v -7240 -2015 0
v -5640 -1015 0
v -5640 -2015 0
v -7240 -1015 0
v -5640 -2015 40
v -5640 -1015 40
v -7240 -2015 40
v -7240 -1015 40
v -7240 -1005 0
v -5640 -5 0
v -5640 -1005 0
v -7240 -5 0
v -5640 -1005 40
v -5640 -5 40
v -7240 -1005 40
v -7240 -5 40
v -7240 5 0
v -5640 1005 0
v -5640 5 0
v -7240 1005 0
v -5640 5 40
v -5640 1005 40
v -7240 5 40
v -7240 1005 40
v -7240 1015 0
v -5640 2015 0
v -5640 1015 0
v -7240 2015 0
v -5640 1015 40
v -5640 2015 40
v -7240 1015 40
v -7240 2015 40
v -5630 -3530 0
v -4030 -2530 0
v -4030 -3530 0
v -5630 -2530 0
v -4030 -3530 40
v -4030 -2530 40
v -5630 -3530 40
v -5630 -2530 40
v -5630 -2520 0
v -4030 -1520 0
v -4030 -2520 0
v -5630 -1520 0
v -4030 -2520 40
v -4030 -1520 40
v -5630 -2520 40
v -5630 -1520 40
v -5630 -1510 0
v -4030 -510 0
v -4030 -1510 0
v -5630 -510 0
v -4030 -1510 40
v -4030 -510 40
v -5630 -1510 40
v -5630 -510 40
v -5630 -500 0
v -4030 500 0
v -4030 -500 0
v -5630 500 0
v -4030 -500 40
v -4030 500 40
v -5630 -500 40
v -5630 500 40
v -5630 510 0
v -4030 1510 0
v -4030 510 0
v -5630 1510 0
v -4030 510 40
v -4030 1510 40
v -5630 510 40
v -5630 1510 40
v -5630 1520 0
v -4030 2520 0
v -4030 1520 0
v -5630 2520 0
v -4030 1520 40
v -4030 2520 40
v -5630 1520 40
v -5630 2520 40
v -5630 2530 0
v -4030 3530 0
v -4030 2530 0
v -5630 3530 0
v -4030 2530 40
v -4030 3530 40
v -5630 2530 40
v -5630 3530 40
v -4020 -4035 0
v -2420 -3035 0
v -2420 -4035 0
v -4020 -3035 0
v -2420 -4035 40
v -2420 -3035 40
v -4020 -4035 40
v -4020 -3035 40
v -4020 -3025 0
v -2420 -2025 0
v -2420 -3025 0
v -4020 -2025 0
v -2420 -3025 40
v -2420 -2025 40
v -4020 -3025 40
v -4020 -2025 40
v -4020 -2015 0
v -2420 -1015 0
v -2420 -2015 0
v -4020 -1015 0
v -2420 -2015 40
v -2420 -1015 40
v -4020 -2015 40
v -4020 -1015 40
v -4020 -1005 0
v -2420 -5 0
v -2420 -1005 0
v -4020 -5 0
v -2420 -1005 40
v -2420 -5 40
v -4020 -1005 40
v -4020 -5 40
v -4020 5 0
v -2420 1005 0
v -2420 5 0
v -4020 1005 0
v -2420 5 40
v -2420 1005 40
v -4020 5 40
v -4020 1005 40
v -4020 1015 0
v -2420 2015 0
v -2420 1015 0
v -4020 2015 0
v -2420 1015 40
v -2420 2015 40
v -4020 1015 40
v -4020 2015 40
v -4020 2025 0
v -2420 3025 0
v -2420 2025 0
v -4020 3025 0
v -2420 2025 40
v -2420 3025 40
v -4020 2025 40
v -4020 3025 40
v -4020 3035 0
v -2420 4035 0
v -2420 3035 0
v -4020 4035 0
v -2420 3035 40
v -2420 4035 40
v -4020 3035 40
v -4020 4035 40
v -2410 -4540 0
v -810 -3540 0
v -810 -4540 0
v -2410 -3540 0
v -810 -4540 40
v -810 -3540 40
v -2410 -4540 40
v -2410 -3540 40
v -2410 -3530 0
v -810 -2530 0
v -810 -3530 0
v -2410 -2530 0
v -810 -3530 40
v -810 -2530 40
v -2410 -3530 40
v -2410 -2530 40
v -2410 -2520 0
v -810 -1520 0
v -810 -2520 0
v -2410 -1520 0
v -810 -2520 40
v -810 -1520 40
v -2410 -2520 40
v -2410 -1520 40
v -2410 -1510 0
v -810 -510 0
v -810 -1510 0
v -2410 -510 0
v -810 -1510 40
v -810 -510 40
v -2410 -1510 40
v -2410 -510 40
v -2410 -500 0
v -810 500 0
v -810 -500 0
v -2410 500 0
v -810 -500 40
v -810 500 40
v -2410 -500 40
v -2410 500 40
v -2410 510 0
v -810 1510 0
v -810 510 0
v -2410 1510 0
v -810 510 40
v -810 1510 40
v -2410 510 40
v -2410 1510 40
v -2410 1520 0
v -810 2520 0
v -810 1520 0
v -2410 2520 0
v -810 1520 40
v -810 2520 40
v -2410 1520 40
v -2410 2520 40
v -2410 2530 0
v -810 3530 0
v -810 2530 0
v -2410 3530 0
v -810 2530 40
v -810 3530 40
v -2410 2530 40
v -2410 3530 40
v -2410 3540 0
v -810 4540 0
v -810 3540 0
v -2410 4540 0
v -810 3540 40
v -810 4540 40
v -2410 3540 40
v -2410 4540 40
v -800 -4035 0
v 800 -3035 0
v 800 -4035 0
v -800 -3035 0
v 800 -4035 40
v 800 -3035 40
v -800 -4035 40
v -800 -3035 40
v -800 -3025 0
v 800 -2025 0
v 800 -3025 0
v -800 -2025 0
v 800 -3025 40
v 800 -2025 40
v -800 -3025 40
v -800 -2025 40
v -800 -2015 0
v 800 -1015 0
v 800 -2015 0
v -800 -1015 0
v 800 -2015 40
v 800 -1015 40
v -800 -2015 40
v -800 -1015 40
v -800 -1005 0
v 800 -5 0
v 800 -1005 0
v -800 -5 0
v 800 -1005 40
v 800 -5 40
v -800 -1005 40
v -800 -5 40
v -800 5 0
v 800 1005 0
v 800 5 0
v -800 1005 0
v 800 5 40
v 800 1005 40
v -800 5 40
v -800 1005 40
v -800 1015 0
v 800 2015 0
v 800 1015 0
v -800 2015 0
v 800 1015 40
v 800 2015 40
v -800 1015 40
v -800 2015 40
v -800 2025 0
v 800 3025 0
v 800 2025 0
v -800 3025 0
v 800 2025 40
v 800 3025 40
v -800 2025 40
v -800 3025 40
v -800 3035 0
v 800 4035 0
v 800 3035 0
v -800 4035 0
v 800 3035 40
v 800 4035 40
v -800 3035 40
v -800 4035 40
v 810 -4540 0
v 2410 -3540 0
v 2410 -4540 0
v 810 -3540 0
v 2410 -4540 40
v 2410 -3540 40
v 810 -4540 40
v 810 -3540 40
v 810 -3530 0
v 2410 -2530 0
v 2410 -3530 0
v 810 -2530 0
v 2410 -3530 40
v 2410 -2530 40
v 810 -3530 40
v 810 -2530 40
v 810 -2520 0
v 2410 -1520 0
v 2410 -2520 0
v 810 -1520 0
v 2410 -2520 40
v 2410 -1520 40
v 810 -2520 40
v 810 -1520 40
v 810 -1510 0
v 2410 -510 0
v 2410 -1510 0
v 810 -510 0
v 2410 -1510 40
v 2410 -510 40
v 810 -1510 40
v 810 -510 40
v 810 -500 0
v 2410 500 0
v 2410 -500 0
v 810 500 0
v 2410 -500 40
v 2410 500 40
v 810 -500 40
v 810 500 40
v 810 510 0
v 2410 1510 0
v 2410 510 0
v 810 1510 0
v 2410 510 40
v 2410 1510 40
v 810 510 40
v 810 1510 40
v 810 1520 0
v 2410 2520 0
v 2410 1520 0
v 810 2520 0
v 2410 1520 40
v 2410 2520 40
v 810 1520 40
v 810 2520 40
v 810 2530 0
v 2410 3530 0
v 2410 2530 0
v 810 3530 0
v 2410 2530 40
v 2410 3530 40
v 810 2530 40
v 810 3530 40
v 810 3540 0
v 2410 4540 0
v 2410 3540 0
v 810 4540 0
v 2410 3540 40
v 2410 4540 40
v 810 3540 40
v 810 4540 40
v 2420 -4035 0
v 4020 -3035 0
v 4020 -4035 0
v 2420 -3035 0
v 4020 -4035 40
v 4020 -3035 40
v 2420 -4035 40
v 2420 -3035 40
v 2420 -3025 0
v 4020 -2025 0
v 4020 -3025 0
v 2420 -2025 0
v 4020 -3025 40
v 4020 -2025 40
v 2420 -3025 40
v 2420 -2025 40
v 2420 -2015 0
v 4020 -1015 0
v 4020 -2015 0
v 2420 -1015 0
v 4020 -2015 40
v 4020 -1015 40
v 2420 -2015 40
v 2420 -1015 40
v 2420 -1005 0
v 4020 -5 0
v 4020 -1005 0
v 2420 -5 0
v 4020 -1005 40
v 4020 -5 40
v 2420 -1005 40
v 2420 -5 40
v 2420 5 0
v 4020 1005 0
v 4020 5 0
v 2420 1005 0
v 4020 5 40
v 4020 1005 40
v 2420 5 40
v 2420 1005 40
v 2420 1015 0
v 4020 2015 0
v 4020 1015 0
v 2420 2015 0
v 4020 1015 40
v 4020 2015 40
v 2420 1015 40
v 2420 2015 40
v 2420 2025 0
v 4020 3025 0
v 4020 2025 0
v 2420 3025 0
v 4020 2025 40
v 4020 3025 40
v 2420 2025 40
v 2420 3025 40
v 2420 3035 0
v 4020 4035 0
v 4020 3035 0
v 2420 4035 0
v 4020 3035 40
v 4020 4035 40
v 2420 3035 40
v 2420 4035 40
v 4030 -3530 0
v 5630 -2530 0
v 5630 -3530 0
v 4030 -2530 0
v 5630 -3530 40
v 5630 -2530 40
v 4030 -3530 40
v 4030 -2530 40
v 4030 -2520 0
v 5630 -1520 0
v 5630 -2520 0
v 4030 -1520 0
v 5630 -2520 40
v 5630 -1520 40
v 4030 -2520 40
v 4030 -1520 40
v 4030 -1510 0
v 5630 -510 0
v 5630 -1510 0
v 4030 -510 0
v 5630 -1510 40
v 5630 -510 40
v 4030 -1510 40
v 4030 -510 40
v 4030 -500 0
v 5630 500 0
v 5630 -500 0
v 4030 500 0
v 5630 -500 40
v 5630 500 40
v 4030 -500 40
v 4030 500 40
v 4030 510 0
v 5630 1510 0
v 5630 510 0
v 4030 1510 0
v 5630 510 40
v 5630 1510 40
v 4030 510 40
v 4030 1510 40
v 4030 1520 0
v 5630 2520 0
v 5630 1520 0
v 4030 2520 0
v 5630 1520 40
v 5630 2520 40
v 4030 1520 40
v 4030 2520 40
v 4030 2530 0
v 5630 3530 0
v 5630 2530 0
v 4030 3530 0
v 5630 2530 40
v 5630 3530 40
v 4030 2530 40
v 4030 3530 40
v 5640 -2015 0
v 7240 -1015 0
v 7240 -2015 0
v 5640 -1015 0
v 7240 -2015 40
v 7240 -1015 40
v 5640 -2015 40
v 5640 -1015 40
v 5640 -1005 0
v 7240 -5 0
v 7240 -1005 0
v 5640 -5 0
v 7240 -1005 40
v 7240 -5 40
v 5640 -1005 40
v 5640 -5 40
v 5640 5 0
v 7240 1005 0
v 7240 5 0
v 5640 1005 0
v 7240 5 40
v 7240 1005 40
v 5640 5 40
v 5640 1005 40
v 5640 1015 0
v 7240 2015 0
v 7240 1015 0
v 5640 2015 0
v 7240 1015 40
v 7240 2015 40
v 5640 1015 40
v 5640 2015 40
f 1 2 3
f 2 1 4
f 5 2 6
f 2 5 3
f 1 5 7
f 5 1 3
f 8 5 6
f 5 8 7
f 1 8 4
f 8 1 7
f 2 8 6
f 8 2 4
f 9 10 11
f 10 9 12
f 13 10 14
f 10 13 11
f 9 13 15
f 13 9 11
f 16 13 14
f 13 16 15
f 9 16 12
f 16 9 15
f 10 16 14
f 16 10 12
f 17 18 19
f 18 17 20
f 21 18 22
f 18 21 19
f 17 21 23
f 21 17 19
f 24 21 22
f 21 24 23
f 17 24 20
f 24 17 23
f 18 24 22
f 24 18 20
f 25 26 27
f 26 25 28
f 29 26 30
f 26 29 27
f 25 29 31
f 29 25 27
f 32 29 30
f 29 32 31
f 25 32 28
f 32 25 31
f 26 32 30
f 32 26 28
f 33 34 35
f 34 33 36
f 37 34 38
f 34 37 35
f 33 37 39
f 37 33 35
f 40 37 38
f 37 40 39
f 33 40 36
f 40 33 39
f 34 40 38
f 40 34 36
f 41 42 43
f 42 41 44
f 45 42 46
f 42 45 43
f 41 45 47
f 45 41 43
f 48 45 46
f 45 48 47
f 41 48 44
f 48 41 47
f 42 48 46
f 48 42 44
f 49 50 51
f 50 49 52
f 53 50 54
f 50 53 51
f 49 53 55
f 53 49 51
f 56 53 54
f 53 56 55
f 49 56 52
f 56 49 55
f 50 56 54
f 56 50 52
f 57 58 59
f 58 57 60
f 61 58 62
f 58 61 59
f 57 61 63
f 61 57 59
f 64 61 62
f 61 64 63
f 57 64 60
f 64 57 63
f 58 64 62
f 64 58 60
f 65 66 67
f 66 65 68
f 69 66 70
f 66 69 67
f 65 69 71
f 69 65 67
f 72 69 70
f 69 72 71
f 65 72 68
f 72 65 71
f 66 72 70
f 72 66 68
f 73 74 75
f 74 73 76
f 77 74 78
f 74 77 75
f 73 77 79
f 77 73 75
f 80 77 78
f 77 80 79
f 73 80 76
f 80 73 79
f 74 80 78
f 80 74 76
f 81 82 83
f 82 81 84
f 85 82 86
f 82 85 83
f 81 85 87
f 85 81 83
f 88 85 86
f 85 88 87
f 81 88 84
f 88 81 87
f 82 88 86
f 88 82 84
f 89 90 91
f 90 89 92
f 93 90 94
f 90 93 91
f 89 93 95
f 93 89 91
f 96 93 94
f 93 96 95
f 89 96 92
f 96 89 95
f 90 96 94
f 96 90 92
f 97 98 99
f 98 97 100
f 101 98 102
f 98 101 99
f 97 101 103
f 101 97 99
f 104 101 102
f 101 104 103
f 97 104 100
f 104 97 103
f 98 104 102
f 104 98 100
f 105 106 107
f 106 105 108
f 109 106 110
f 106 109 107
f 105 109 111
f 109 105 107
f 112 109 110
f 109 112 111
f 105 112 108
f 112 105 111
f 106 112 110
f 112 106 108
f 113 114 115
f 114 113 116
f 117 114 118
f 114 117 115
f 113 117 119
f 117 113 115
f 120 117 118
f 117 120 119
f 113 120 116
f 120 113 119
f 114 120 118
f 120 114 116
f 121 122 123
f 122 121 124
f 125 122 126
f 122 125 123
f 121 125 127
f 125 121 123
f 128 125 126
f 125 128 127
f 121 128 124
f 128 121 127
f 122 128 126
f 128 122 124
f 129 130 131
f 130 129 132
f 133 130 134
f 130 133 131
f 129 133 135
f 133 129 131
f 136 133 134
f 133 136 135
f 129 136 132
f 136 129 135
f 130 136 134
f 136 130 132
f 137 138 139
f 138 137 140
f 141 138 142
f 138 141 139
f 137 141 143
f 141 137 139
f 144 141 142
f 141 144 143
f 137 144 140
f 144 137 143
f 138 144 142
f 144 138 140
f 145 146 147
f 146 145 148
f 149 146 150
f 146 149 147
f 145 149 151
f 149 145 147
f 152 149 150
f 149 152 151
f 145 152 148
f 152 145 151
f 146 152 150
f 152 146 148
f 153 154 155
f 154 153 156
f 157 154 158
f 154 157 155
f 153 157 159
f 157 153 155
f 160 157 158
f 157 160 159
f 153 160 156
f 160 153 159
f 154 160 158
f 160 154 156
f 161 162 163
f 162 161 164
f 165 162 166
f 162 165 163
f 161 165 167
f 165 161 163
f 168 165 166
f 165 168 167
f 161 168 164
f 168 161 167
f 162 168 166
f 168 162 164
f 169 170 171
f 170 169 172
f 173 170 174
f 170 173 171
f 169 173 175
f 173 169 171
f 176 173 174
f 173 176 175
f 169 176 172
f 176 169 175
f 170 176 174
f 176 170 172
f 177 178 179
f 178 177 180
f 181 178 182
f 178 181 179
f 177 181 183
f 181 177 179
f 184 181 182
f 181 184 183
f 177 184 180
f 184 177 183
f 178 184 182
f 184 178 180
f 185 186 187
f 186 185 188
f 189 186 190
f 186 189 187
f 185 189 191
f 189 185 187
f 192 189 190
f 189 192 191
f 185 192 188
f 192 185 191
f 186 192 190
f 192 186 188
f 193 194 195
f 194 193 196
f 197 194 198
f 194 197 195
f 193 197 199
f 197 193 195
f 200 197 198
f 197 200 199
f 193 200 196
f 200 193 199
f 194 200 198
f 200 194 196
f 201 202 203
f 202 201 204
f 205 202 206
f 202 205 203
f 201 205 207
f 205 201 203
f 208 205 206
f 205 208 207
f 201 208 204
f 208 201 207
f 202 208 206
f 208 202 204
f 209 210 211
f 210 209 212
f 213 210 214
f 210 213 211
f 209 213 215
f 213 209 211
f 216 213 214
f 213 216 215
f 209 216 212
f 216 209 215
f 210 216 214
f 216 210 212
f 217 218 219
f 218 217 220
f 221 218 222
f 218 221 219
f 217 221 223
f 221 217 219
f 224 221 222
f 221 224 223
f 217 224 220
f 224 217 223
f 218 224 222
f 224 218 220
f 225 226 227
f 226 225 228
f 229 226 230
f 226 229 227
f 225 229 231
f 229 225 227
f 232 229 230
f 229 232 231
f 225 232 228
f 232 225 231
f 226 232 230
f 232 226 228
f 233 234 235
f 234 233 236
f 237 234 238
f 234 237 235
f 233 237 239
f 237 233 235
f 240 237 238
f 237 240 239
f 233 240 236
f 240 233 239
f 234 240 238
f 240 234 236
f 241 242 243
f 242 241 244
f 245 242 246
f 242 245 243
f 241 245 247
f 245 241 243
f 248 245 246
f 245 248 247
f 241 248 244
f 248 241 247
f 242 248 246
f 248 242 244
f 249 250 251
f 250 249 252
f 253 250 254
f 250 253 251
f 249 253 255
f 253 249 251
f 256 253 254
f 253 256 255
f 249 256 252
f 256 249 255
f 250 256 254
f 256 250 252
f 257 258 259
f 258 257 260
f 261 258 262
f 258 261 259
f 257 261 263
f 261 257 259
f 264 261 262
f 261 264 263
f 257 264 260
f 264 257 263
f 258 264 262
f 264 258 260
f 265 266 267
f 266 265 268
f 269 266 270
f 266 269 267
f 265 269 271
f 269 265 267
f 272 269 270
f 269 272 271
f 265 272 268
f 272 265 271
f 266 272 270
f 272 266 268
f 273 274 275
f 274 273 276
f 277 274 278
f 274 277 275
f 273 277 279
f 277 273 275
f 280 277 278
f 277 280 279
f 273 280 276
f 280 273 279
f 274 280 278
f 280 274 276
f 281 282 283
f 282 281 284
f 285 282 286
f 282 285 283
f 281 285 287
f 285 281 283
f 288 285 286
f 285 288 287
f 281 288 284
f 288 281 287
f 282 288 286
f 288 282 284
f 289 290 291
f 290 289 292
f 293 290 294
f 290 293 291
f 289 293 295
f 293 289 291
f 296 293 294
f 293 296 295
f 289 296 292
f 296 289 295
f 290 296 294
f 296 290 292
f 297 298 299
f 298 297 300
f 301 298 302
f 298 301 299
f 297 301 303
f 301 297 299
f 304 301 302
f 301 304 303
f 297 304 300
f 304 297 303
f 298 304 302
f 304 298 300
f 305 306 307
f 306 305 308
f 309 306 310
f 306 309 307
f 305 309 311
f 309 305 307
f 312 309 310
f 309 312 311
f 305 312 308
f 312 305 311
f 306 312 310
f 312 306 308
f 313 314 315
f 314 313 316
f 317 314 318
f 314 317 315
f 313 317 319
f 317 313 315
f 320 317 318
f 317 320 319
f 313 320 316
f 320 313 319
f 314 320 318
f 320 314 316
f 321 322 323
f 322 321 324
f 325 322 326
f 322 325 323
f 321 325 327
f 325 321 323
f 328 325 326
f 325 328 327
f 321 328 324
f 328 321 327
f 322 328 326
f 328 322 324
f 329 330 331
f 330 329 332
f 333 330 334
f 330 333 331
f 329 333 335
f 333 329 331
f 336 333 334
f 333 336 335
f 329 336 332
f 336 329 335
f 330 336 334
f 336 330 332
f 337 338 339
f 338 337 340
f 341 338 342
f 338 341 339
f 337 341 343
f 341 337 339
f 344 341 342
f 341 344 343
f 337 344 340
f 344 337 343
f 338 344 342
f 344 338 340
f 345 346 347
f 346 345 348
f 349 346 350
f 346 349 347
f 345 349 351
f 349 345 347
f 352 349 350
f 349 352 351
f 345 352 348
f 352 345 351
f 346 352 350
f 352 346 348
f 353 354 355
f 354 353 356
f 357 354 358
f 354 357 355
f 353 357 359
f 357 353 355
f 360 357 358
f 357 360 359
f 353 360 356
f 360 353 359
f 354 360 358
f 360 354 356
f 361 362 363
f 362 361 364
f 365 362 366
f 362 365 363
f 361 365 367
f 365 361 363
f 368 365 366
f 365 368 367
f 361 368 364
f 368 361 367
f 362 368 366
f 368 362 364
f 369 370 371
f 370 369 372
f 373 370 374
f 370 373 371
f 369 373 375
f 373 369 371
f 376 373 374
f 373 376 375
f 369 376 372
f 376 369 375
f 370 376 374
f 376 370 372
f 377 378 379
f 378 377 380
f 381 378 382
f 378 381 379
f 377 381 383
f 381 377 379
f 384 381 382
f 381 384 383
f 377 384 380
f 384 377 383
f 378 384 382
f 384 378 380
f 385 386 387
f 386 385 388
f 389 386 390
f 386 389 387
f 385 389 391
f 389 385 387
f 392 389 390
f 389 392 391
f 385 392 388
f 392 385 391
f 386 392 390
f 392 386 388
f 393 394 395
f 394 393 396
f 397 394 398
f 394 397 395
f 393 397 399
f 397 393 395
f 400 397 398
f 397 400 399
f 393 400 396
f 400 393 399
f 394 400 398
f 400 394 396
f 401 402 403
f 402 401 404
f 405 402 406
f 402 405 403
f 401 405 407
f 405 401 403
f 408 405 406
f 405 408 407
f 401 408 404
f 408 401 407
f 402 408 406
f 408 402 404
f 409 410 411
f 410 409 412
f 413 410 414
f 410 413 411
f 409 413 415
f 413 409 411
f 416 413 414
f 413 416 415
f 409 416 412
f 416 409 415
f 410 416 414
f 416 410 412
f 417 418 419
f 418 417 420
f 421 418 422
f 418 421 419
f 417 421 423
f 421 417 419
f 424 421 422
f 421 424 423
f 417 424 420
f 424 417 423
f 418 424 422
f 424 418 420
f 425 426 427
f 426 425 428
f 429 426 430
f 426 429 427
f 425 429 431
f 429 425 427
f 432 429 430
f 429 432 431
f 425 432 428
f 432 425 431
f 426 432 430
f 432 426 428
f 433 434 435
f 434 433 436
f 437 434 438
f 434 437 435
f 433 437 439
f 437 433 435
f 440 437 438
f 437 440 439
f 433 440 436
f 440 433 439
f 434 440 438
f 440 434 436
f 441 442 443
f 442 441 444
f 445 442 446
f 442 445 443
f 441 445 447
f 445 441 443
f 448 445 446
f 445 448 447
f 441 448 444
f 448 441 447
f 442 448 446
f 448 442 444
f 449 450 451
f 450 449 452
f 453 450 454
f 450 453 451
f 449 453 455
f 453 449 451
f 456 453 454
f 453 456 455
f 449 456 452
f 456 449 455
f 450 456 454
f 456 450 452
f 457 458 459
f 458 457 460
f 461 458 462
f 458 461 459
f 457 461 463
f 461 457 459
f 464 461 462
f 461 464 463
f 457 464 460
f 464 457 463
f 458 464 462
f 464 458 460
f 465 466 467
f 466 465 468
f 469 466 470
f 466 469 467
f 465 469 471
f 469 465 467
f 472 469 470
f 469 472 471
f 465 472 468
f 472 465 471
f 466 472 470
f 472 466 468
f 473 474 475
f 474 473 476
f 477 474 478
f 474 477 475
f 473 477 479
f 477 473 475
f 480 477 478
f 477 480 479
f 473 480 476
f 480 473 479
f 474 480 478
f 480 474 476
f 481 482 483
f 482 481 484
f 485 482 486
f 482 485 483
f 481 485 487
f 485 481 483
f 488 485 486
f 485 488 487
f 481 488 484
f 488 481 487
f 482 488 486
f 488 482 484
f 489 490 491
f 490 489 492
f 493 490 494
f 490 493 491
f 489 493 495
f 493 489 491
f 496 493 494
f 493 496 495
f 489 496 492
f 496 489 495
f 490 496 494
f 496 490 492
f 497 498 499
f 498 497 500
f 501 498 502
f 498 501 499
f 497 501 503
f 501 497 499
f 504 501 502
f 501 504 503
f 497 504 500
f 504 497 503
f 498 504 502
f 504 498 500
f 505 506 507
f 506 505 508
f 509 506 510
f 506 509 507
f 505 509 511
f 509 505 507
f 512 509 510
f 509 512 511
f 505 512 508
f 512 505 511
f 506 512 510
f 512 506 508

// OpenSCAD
// Generated by Parametrix
ca_surface_faceSurface_000 = [ [ -7240.0000, -2015.0000 ],[ -5640.0000, -2015.0000 ],[ -5640.0000, -1015.0000 ],[ -7240.0000, -1015.0000 ],[ -7240.0000, -2015.0000 ] ];
cb_surface_faceSurface_000 = [  0, 1, 2, 3, 4 ];
ca_surface_faceSurface_001 = [ [ -7240.0000, -1005.0000 ],[ -5640.0000, -1005.0000 ],[ -5640.0000, -5.0000 ],[ -7240.0000, -5.0000 ],[ -7240.0000, -1005.0000 ] ];
cb_surface_faceSurface_001 = [  5, 6, 7, 8, 9 ];
ca_surface_faceSurface_002 = [ [ -7240.0000, 5.0000 ],[ -5640.0000, 5.0000 ],[ -5640.0000, 1005.0000 ],[ -7240.0000, 1005.0000 ],[ -7240.0000, 5.0000 ] ];
cb_surface_faceSurface_002 = [  10, 11, 12, 13, 14 ];
ca_surface_faceSurface_003 = [ [ -7240.0000, 1015.0000 ],[ -5640.0000, 1015.0000 ],[ -5640.0000, 2015.0000 ],[ -7240.0000, 2015.0000 ],[ -7240.0000, 1015.0000 ] ];
cb_surface_faceSurface_003 = [  15, 16, 17, 18, 19 ];
ca_surface_faceSurface_004 = [ [ -5630.0000, -3530.0000 ],[ -4030.0000, -3530.0000 ],[ -4030.0000, -2530.0000 ],[ -5630.0000, -2530.0000 ],[ -5630.0000, -3530.0000 ] ];
cb_surface_faceSurface_004 = [  20, 21, 22, 23, 24 ];
ca_surface_faceSurface_005 = [ [ -5630.0000, -2520.0000 ],[ -4030.0000, -2520.0000 ],[ -4030.0000, -1520.0000 ],[ -5630.0000, -1520.0000 ],[ -5630.0000, -2520.0000 ] ];
cb_surface_faceSurface_005 = [  25, 26, 27, 28, 29 ];
ca_surface_faceSurface_006 = [ [ -5630.0000, -1510.0000 ],[ -4030.0000, -1510.0000 ],[ -4030.0000, -510.0000 ],[ -5630.0000, -510.0000 ],[ -5630.0000, -1510.0000 ] ];
cb_surface_faceSurface_006 = [  30, 31, 32, 33, 34 ];
ca_surface_faceSurface_007 = [ [ -5630.0000, -500.0000 ],[ -4030.0000, -500.0000 ],[ -4030.0000, 500.0000 ],[ -5630.0000, 500.0000 ],[ -5630.0000, -500.0000 ] ];
cb_surface_faceSurface_007 = [  35, 36, 37, 38, 39 ];
ca_surface_faceSurface_008 = [ [ -5630.0000, 510.0000 ],[ -4030.0000, 510.0000 ],[ -4030.0000, 1510.0000 ],[ -5630.0000, 1510.0000 ],[ -5630.0000, 510.0000 ] ];
cb_surface_faceSurface_008 = [  40, 41, 42, 43, 44 ];
ca_surface_faceSurface_009 = [ [ -5630.0000, 1520.0000 ],[ -4030.0000, 1520.0000 ],[ -4030.0000, 2520.0000 ],[ -5630.0000, 2520.0000 ],[ -5630.0000, 1520.0000 ] ];
cb_surface_faceSurface_009 = [  45, 46, 47, 48, 49 ];
ca_surface_faceSurface_010 = [ [ -5630.0000, 2530.0000 ],[ -4030.0000, 2530.0000 ],[ -4030.0000, 3530.0000 ],[ -5630.0000, 3530.0000 ],[ -5630.0000, 2530.0000 ] ];
cb_surface_faceSurface_010 = [  50, 51, 52, 53, 54 ];
ca_surface_faceSurface_011 = [ [ -4020.0000, -4035.0000 ],[ -2420.0000, -4035.0000 ],[ -2420.0000, -3035.0000 ],[ -4020.0000, -3035.0000 ],[ -4020.0000, -4035.0000 ] ];
cb_surface_faceSurface_011 = [  55, 56, 57, 58, 59 ];
ca_surface_faceSurface_012 = [ [ -4020.0000, -3025.0000 ],[ -2420.0000, -3025.0000 ],[ -2420.0000, -2025.0000 ],[ -4020.0000, -2025.0000 ],[ -4020.0000, -3025.0000 ] ];
cb_surface_faceSurface_012 = [  60, 61, 62, 63, 64 ];
ca_surface_faceSurface_013 = [ [ -4020.0000, -2015.0000 ],[ -2420.0000, -2015.0000 ],[ -2420.0000, -1015.0000 ],[ -4020.0000, -1015.0000 ],[ -4020.0000, -2015.0000 ] ];
cb_surface_faceSurface_013 = [  65, 66, 67, 68, 69 ];
ca_surface_faceSurface_014 = [ [ -4020.0000, -1005.0000 ],[ -2420.0000, -1005.0000 ],[ -2420.0000, -5.0000 ],[ -4020.0000, -5.0000 ],[ -4020.0000, -1005.0000 ] ];
cb_surface_faceSurface_014 = [  70, 71, 72, 73, 74 ];
ca_surface_faceSurface_015 = [ [ -4020.0000, 5.0000 ],[ -2420.0000, 5.0000 ],[ -2420.0000, 1005.0000 ],[ -4020.0000, 1005.0000 ],[ -4020.0000, 5.0000 ] ];
cb_surface_faceSurface_015 = [  75, 76, 77, 78, 79 ];
ca_surface_faceSurface_016 = [ [ -4020.0000, 1015.0000 ],[ -2420.0000, 1015.0000 ],[ -2420.0000, 2015.0000 ],[ -4020.0000, 2015.0000 ],[ -4020.0000, 1015.0000 ] ];
cb_surface_faceSurface_016 = [  80, 81, 82, 83, 84 ];
ca_surface_faceSurface_017 = [ [ -4020.0000, 2025.0000 ],[ -2420.0000, 2025.0000 ],[ -2420.0000, 3025.0000 ],[ -4020.0000, 3025.0000 ],[ -4020.0000, 2025.0000 ] ];
cb_surface_faceSurface_017 = [  85, 86, 87, 88, 89 ];
ca_surface_faceSurface_018 = [ [ -4020.0000, 3035.0000 ],[ -2420.0000, 3035.0000 ],[ -2420.0000, 4035.0000 ],[ -4020.0000, 4035.0000 ],[ -4020.0000, 3035.0000 ] ];
cb_surface_faceSurface_018 = [  90, 91, 92, 93, 94 ];
ca_surface_faceSurface_019 = [ [ -2410.0000, -4540.0000 ],[ -810.0000, -4540.0000 ],[ -810.0000, -3540.0000 ],[ -2410.0000, -3540.0000 ],[ -2410.0000, -4540.0000 ] ];
cb_surface_faceSurface_019 = [  95, 96, 97, 98, 99 ];
ca_surface_faceSurface_020 = [ [ -2410.0000, -3530.0000 ],[ -810.0000, -3530.0000 ],[ -810.0000, -2530.0000 ],[ -2410.0000, -2530.0000 ],[ -2410.0000, -3530.0000 ] ];
cb_surface_faceSurface_020 = [  100, 101, 102, 103, 104 ];
ca_surface_faceSurface_021 = [ [ -2410.0000, -2520.0000 ],[ -810.0000, -2520.0000 ],[ -810.0000, -1520.0000 ],[ -2410.0000, -1520.0000 ],[ -2410.0000, -2520.0000 ] ];
cb_surface_faceSurface_021 = [  105, 106, 107, 108, 109 ];
ca_surface_faceSurface_022 = [ [ -2410.0000, -1510.0000 ],[ -810.0000, -1510.0000 ],[ -810.0000, -510.0000 ],[ -2410.0000, -510.0000 ],[ -2410.0000, -1510.0000 ] ];
cb_surface_faceSurface_022 = [  110, 111, 112, 113, 114 ];
ca_surface_faceSurface_023 = [ [ -2410.0000, -500.0000 ],[ -810.0000, -500.0000 ],[ -810.0000, 500.0000 ],[ -2410.0000, 500.0000 ],[ -2410.0000, -500.0000 ] ];
cb_surface_faceSurface_023 = [  115, 116, 117, 118, 119 ];
ca_surface_faceSurface_024 = [ [ -2410.0000, 510.0000 ],[ -810.0000, 510.0000 ],[ -810.0000, 1510.0000 ],[ -2410.0000, 1510.0000 ],[ -2410.0000, 510.0000 ] ];
cb_surface_faceSurface_024 = [  120, 121, 122, 123, 124 ];
ca_surface_faceSurface_025 = [ [ -2410.0000, 1520.0000 ],[ -810.0000, 1520.0000 ],[ -810.0000, 2520.0000 ],[ -2410.0000, 2520.0000 ],[ -2410.0000, 1520.0000 ] ];
cb_surface_faceSurface_025 = [  125, 126, 127, 128, 129 ];
ca_surface_faceSurface_026 = [ [ -2410.0000, 2530.0000 ],[ -810.0000, 2530.0000 ],[ -810.0000, 3530.0000 ],[ -2410.0000, 3530.0000 ],[ -2410.0000, 2530.0000 ] ];
cb_surface_faceSurface_026 = [  130, 131, 132, 133, 134 ];
ca_surface_faceSurface_027 = [ [ -2410.0000, 3540.0000 ],[ -810.0000, 3540.0000 ],[ -810.0000, 4540.0000 ],[ -2410.0000, 4540.0000 ],[ -2410.0000, 3540.0000 ] ];
cb_surface_faceSurface_027 = [  135, 136, 137, 138, 139 ];
ca_surface_faceSurface_028 = [ [ -800.0000, -4035.0000 ],[ 800.0000, -4035.0000 ],[ 800.0000, -3035.0000 ],[ -800.0000, -3035.0000 ],[ -800.0000, -4035.0000 ] ];
cb_surface_faceSurface_028 = [  140, 141, 142, 143, 144 ];
ca_surface_faceSurface_029 = [ [ -800.0000, -3025.0000 ],[ 800.0000, -3025.0000 ],[ 800.0000, -2025.0000 ],[ -800.0000, -2025.0000 ],[ -800.0000, -3025.0000 ] ];
cb_surface_faceSurface_029 = [  145, 146, 147, 148, 149 ];
ca_surface_faceSurface_030 = [ [ -800.0000, -2015.0000 ],[ 800.0000, -2015.0000 ],[ 800.0000, -1015.0000 ],[ -800.0000, -1015.0000 ],[ -800.0000, -2015.0000 ] ];
cb_surface_faceSurface_030 = [  150, 151, 152, 153, 154 ];
ca_surface_faceSurface_031 = [ [ -800.0000, -1005.0000 ],[ 800.0000, -1005.0000 ],[ 800.0000, -5.0000 ],[ -800.0000, -5.0000 ],[ -800.0000, -1005.0000 ] ];
cb_surface_faceSurface_031 = [  155, 156, 157, 158, 159 ];
ca_surface_faceSurface_032 = [ [ -800.0000, 5.0000 ],[ 800.0000, 5.0000 ],[ 800.0000, 1005.0000 ],[ -800.0000, 1005.0000 ],[ -800.0000, 5.0000 ] ];
cb_surface_faceSurface_032 = [  160, 161, 162, 163, 164 ];
ca_surface_faceSurface_033 = [ [ -800.0000, 1015.0000 ],[ 800.0000, 1015.0000 ],[ 800.0000, 2015.0000 ],[ -800.0000, 2015.0000 ],[ -800.0000, 1015.0000 ] ];
cb_surface_faceSurface_033 = [  165, 166, 167, 168, 169 ];
ca_surface_faceSurface_034 = [ [ -800.0000, 2025.0000 ],[ 800.0000, 2025.0000 ],[ 800.0000, 3025.0000 ],[ -800.0000, 3025.0000 ],[ -800.0000, 2025.0000 ] ];
cb_surface_faceSurface_034 = [  170, 171, 172, 173, 174 ];
ca_surface_faceSurface_035 = [ [ -800.0000, 3035.0000 ],[ 800.0000, 3035.0000 ],[ 800.0000, 4035.0000 ],[ -800.0000, 4035.0000 ],[ -800.0000, 3035.0000 ] ];
cb_surface_faceSurface_035 = [  175, 176, 177, 178, 179 ];
ca_surface_faceSurface_036 = [ [ 810.0000, -4540.0000 ],[ 2410.0000, -4540.0000 ],[ 2410.0000, -3540.0000 ],[ 810.0000, -3540.0000 ],[ 810.0000, -4540.0000 ] ];
cb_surface_faceSurface_036 = [  180, 181, 182, 183, 184 ];
ca_surface_faceSurface_037 = [ [ 810.0000, -3530.0000 ],[ 2410.0000, -3530.0000 ],[ 2410.0000, -2530.0000 ],[ 810.0000, -2530.0000 ],[ 810.0000, -3530.0000 ] ];
cb_surface_faceSurface_037 = [  185, 186, 187, 188, 189 ];
ca_surface_faceSurface_038 = [ [ 810.0000, -2520.0000 ],[ 2410.0000, -2520.0000 ],[ 2410.0000, -1520.0000 ],[ 810.0000, -1520.0000 ],[ 810.0000, -2520.0000 ] ];
cb_surface_faceSurface_038 = [  190, 191, 192, 193, 194 ];
ca_surface_faceSurface_039 = [ [ 810.0000, -1510.0000 ],[ 2410.0000, -1510.0000 ],[ 2410.0000, -510.0000 ],[ 810.0000, -510.0000 ],[ 810.0000, -1510.0000 ] ];
cb_surface_faceSurface_039 = [  195, 196, 197, 198, 199 ];
ca_surface_faceSurface_040 = [ [ 810.0000, -500.0000 ],[ 2410.0000, -500.0000 ],[ 2410.0000, 500.0000 ],[ 810.0000, 500.0000 ],[ 810.0000, -500.0000 ] ];
cb_surface_faceSurface_040 = [  200, 201, 202, 203, 204 ];
ca_surface_faceSurface_041 = [ [ 810.0000, 510.0000 ],[ 2410.0000, 510.0000 ],[ 2410.0000, 1510.0000 ],[ 810.0000, 1510.0000 ],[ 810.0000, 510.0000 ] ];
cb_surface_faceSurface_041 = [  205, 206, 207, 208, 209 ];
ca_surface_faceSurface_042 = [ [ 810.0000, 1520.0000 ],[ 2410.0000, 1520.0000 ],[ 2410.0000, 2520.0000 ],[ 810.0000, 2520.0000 ],[ 810.0000, 1520.0000 ] ];
cb_surface_faceSurface_042 = [  210, 211, 212, 213, 214 ];
ca_surface_faceSurface_043 = [ [ 810.0000, 2530.0000 ],[ 2410.0000, 2530.0000 ],[ 2410.0000, 3530.0000 ],[ 810.0000, 3530.0000 ],[ 810.0000, 2530.0000 ] ];
cb_surface_faceSurface_043 = [  215, 216, 217, 218, 219 ];
ca_surface_faceSurface_044 = [ [ 810.0000, 3540.0000 ],[ 2410.0000, 3540.0000 ],[ 2410.0000, 4540.0000 ],[ 810.0000, 4540.0000 ],[ 810.0000, 3540.0000 ] ];
cb_surface_faceSurface_044 = [  220, 221, 222, 223, 224 ];
ca_surface_faceSurface_045 = [ [ 2420.0000, -4035.0000 ],[ 4020.0000, -4035.0000 ],[ 4020.0000, -3035.0000 ],[ 2420.0000, -3035.0000 ],[ 2420.0000, -4035.0000 ] ];
cb_surface_faceSurface_045 = [  225, 226, 227, 228, 229 ];
ca_surface_faceSurface_046 = [ [ 2420.0000, -3025.0000 ],[ 4020.0000, -3025.0000 ],[ 4020.0000, -2025.0000 ],[ 2420.0000, -2025.0000 ],[ 2420.0000, -3025.0000 ] ];
cb_surface_faceSurface_046 = [  230, 231, 232, 233, 234 ];
ca_surface_faceSurface_047 = [ [ 2420.0000, -2015.0000 ],[ 4020.0000, -2015.0000 ],[ 4020.0000, -1015.0000 ],[ 2420.0000, -1015.0000 ],[ 2420.0000, -2015.0000 ] ];
cb_surface_faceSurface_047 = [  235, 236, 237, 238, 239 ];
ca_surface_faceSurface_048 = [ [ 2420.0000, -1005.0000 ],[ 4020.0000, -1005.0000 ],[ 4020.0000, -5.0000 ],[ 2420.0000, -5.0000 ],[ 2420.0000, -1005.0000 ] ];
cb_surface_faceSurface_048 = [  240, 241, 242, 243, 244 ];
ca_surface_faceSurface_049 = [ [ 2420.0000, 5.0000 ],[ 4020.0000, 5.0000 ],[ 4020.0000, 1005.0000 ],[ 2420.0000, 1005.0000 ],[ 2420.0000, 5.0000 ] ];
cb_surface_faceSurface_049 = [  245, 246, 247, 248, 249 ];
ca_surface_faceSurface_050 = [ [ 2420.0000, 1015.0000 ],[ 4020.0000, 1015.0000 ],[ 4020.0000, 2015.0000 ],[ 2420.0000, 2015.0000 ],[ 2420.0000, 1015.0000 ] ];
cb_surface_faceSurface_050 = [  250, 251, 252, 253, 254 ];
ca_surface_faceSurface_051 = [ [ 2420.0000, 2025.0000 ],[ 4020.0000, 2025.0000 ],[ 4020.0000, 3025.0000 ],[ 2420.0000, 3025.0000 ],[ 2420.0000, 2025.0000 ] ];
cb_surface_faceSurface_051 = [  255, 256, 257, 258, 259 ];
ca_surface_faceSurface_052 = [ [ 2420.0000, 3035.0000 ],[ 4020.0000, 3035.0000 ],[ 4020.0000, 4035.0000 ],[ 2420.0000, 4035.0000 ],[ 2420.0000, 3035.0000 ] ];
cb_surface_faceSurface_052 = [  260, 261, 262, 263, 264 ];
ca_surface_faceSurface_053 = [ [ 4030.0000, -3530.0000 ],[ 5630.0000, -3530.0000 ],[ 5630.0000, -2530.0000 ],[ 4030.0000, -2530.0000 ],[ 4030.0000, -3530.0000 ] ];
cb_surface_faceSurface_053 = [  265, 266, 267, 268, 269 ];
ca_surface_faceSurface_054 = [ [ 4030.0000, -2520.0000 ],[ 5630.0000, -2520.0000 ],[ 5630.0000, -1520.0000 ],[ 4030.0000, -1520.0000 ],[ 4030.0000, -2520.0000 ] ];
cb_surface_faceSurface_054 = [  270, 271, 272, 273, 274 ];
ca_surface_faceSurface_055 = [ [ 4030.0000, -1510.0000 ],[ 5630.0000, -1510.0000 ],[ 5630.0000, -510.0000 ],[ 4030.0000, -510.0000 ],[ 4030.0000, -1510.0000 ] ];
cb_surface_faceSurface_055 = [  275, 276, 277, 278, 279 ];
ca_surface_faceSurface_056 = [ [ 4030.0000, -500.0000 ],[ 5630.0000, -500.0000 ],[ 5630.0000, 500.0000 ],[ 4030.0000, 500.0000 ],[ 4030.0000, -500.0000 ] ];
cb_surface_faceSurface_056 = [  280, 281, 282, 283, 284 ];
ca_surface_faceSurface_057 = [ [ 4030.0000, 510.0000 ],[ 5630.0000, 510.0000 ],[ 5630.0000, 1510.0000 ],[ 4030.0000, 1510.0000 ],[ 4030.0000, 510.0000 ] ];
cb_surface_faceSurface_057 = [  285, 286, 287, 288, 289 ];
ca_surface_faceSurface_058 = [ [ 4030.0000, 1520.0000 ],[ 5630.0000, 1520.0000 ],[ 5630.0000, 2520.0000 ],[ 4030.0000, 2520.0000 ],[ 4030.0000, 1520.0000 ] ];
cb_surface_faceSurface_058 = [  290, 291, 292, 293, 294 ];
ca_surface_faceSurface_059 = [ [ 4030.0000, 2530.0000 ],[ 5630.0000, 2530.0000 ],[ 5630.0000, 3530.0000 ],[ 4030.0000, 3530.0000 ],[ 4030.0000, 2530.0000 ] ];
cb_surface_faceSurface_059 = [  295, 296, 297, 298, 299 ];
ca_surface_faceSurface_060 = [ [ 5640.0000, -2015.0000 ],[ 7240.0000, -2015.0000 ],[ 7240.0000, -1015.0000 ],[ 5640.0000, -1015.0000 ],[ 5640.0000, -2015.0000 ] ];
cb_surface_faceSurface_060 = [  300, 301, 302, 303, 304 ];
ca_surface_faceSurface_061 = [ [ 5640.0000, -1005.0000 ],[ 7240.0000, -1005.0000 ],[ 7240.0000, -5.0000 ],[ 5640.0000, -5.0000 ],[ 5640.0000, -1005.0000 ] ];
cb_surface_faceSurface_061 = [  305, 306, 307, 308, 309 ];
ca_surface_faceSurface_062 = [ [ 5640.0000, 5.0000 ],[ 7240.0000, 5.0000 ],[ 7240.0000, 1005.0000 ],[ 5640.0000, 1005.0000 ],[ 5640.0000, 5.0000 ] ];
cb_surface_faceSurface_062 = [  310, 311, 312, 313, 314 ];
ca_surface_faceSurface_063 = [ [ 5640.0000, 1015.0000 ],[ 7240.0000, 1015.0000 ],[ 7240.0000, 2015.0000 ],[ 5640.0000, 2015.0000 ],[ 5640.0000, 1015.0000 ] ];
cb_surface_faceSurface_063 = [  315, 316, 317, 318, 319 ];
a_surface_faceSurface = concat(ca_surface_faceSurface_000, ca_surface_faceSurface_001, ca_surface_faceSurface_002, ca_surface_faceSurface_003, ca_surface_faceSurface_004, ca_surface_faceSurface_005, ca_surface_faceSurface_006, ca_surface_faceSurface_007, ca_surface_faceSurface_008, ca_surface_faceSurface_009, ca_surface_faceSurface_010, ca_surface_faceSurface_011, ca_surface_faceSurface_012, ca_surface_faceSurface_013, ca_surface_faceSurface_014, ca_surface_faceSurface_015, ca_surface_faceSurface_016, ca_surface_faceSurface_017, ca_surface_faceSurface_018, ca_surface_faceSurface_019, ca_surface_faceSurface_020, ca_surface_faceSurface_021, ca_surface_faceSurface_022, ca_surface_faceSurface_023, ca_surface_faceSurface_024, ca_surface_faceSurface_025, ca_surface_faceSurface_026, ca_surface_faceSurface_027, ca_surface_faceSurface_028, ca_surface_faceSurface_029, ca_surface_faceSurface_030, ca_surface_faceSurface_031, ca_surface_faceSurface_032, ca_surface_faceSurface_033, ca_surface_faceSurface_034, ca_surface_faceSurface_035, ca_surface_faceSurface_036, ca_surface_faceSurface_037, ca_surface_faceSurface_038, ca_surface_faceSurface_039, ca_surface_faceSurface_040, ca_surface_faceSurface_041, ca_surface_faceSurface_042, ca_surface_faceSurface_043, ca_surface_faceSurface_044, ca_surface_faceSurface_045, ca_surface_faceSurface_046, ca_surface_faceSurface_047, ca_surface_faceSurface_048, ca_surface_faceSurface_049, ca_surface_faceSurface_050, ca_surface_faceSurface_051, ca_surface_faceSurface_052, ca_surface_faceSurface_053, ca_surface_faceSurface_054, ca_surface_faceSurface_055, ca_surface_faceSurface_056, ca_surface_faceSurface_057, ca_surface_faceSurface_058, ca_surface_faceSurface_059, ca_surface_faceSurface_060, ca_surface_faceSurface_061, ca_surface_faceSurface_062, ca_surface_faceSurface_063);
b_surface_faceSurface = [cb_surface_faceSurface_000, cb_surface_faceSurface_001, cb_surface_faceSurface_002, cb_surface_faceSurface_003, cb_surface_faceSurface_004, cb_surface_faceSurface_005, cb_surface_faceSurface_006, cb_surface_faceSurface_007, cb_surface_faceSurface_008, cb_surface_faceSurface_009, cb_surface_faceSurface_010, cb_surface_faceSurface_011, cb_surface_faceSurface_012, cb_surface_faceSurface_013, cb_surface_faceSurface_014, cb_surface_faceSurface_015, cb_surface_faceSurface_016, cb_surface_faceSurface_017, cb_surface_faceSurface_018, cb_surface_faceSurface_019, cb_surface_faceSurface_020, cb_surface_faceSurface_021, cb_surface_faceSurface_022, cb_surface_faceSurface_023, cb_surface_faceSurface_024, cb_surface_faceSurface_025, cb_surface_faceSurface_026, cb_surface_faceSurface_027, cb_surface_faceSurface_028, cb_surface_faceSurface_029, cb_surface_faceSurface_030, cb_surface_faceSurface_031, cb_surface_faceSurface_032, cb_surface_faceSurface_033, cb_surface_faceSurface_034, cb_surface_faceSurface_035, cb_surface_faceSurface_036, cb_surface_faceSurface_037, cb_surface_faceSurface_038, cb_surface_faceSurface_039, cb_surface_faceSurface_040, cb_surface_faceSurface_041, cb_surface_faceSurface_042, cb_surface_faceSurface_043, cb_surface_faceSurface_044, cb_surface_faceSurface_045, cb_surface_faceSurface_046, cb_surface_faceSurface_047, cb_surface_faceSurface_048, cb_surface_faceSurface_049, cb_surface_faceSurface_050, cb_surface_faceSurface_051, cb_surface_faceSurface_052, cb_surface_faceSurface_053, cb_surface_faceSurface_054, cb_surface_faceSurface_055, cb_surface_faceSurface_056, cb_surface_faceSurface_057, cb_surface_faceSurface_058, cb_surface_faceSurface_059, cb_surface_faceSurface_060, cb_surface_faceSurface_061, cb_surface_faceSurface_062, cb_surface_faceSurface_063];
ca_surface_faceOnePanel_000 = [ [ 0.0000, 0.0000 ],[ 1600.0000, 0.0000 ],[ 1600.0000, 1000.0000 ],[ 0.0000, 1000.0000 ],[ 0.0000, 0.0000 ] ];
cb_surface_faceOnePanel_000 = [  0, 1, 2, 3, 4 ];
a_surface_faceOnePanel = concat(ca_surface_faceOnePanel_000);
b_surface_faceOnePanel = [cb_surface_faceOnePanel_000];

module subpax_surface_panel_0 () {
	translate( [ -7240, -2015, 0 ])
		rotate( [ 0, 0, 0 ])
			   linear_extrude(height = 40) polygon(a_surface_faceOnePanel, b_surface_faceOnePanel);
}

module subpax_surface_panel_1 () {
	translate( [ -7240, -1005, 0 ])
		rotate( [ 0, 0, 0 ])
			   linear_extrude(height = 40) polygon(a_surface_faceOnePanel, b_surface_faceOnePanel);
}

module subpax_surface_panel_2 () {
	translate( [ -7240, 5, 0 ])
		rotate( [ 0, 0, 0 ])
			   linear_extrude(height = 40) polygon(a_surface_faceOnePanel, b_surface_faceOnePanel);
}

module subpax_surface_panel_3 () {
	translate( [ -7240, 1015, 0 ])
		rotate( [ 0, 0, 0 ])
			   linear_extrude(height = 40) polygon(a_surface_faceOnePanel, b_surface_faceOnePanel);
}

module subpax_surface_panel_4 () {
	translate( [ -5630, -3530, 0 ])
		rotate( [ 0, 0, 0 ])
			   linear_extrude(height = 40) polygon(a_surface_faceOnePanel, b_surface_faceOnePanel);
}

module subpax_surface_panel_5 () {
	translate( [ -5630, -2520, 0 ])
		rotate( [ 0, 0, 0 ])
			   linear_extrude(height = 40) polygon(a_surface_faceOnePanel, b_surface_faceOnePanel);
}

module subpax_surface_panel_6 () {
	translate( [ -5630, -1510, 0 ])
		rotate( [ 0, 0, 0 ])
			   linear_extrude(height = 40) polygon(a_surface_faceOnePanel, b_surface_faceOnePanel);
}

module subpax_surface_panel_7 () {
	translate( [ -5630, -500, 0 ])
		rotate( [ 0, 0, 0 ])
			   linear_extrude(height = 40) polygon(a_surface_faceOnePanel, b_surface_faceOnePanel);
}

module subpax_surface_panel_8 () {
	translate( [ -5630, 510, 0 ])
		rotate( [ 0, 0, 0 ])
			   linear_extrude(height = 40) polygon(a_surface_faceOnePanel, b_surface_faceOnePanel);
}

module subpax_surface_panel_9 () {
	translate( [ -5630, 1520, 0 ])
		rotate( [ 0, 0, 0 ])
			   linear_extrude(height = 40) polygon(a_surface_faceOnePanel, b_surface_faceOnePanel);
}

module subpax_surface_panel_10 () {
	translate( [ -5630, 2530, 0 ])
		rotate( [ 0, 0, 0 ])
			   linear_extrude(height = 40) polygon(a_surface_faceOnePanel, b_surface_faceOnePanel);
}

module subpax_surface_panel_11 () {
	translate( [ -4020, -4035, 0 ])
		rotate( [ 0, 0, 0 ])
			   linear_extrude(height = 40) polygon(a_surface_faceOnePanel, b_surface_faceOnePanel);
}

module subpax_surface_panel_12 () {
	translate( [ -4020, -3025, 0 ])
		rotate( [ 0, 0, 0 ])
			   linear_extrude(height = 40) polygon(a_surface_faceOnePanel, b_surface_faceOnePanel);
}

module subpax_surface_panel_13 () {
	translate( [ -4020, -2015, 0 ])
		rotate( [ 0, 0, 0 ])
			   linear_extrude(height = 40) polygon(a_surface_faceOnePanel, b_surface_faceOnePanel);
}

module subpax_surface_panel_14 () {
	translate( [ -4020, -1005, 0 ])
		rotate( [ 0, 0, 0 ])
			   linear_extrude(height = 40) polygon(a_surface_faceOnePanel, b_surface_faceOnePanel);
}

module subpax_surface_panel_15 () {
	translate( [ -4020, 5, 0 ])
		rotate( [ 0, 0, 0 ])
			   linear_extrude(height = 40) polygon(a_surface_faceOnePanel, b_surface_faceOnePanel);
}

module subpax_surface_panel_16 () {
	translate( [ -4020, 1015, 0 ])
		rotate( [ 0, 0, 0 ])
			   linear_extrude(height = 40) polygon(a_surface_faceOnePanel, b_surface_faceOnePanel);
}

module subpax_surface_panel_17 () {
	translate( [ -4020, 2025, 0 ])
		rotate( [ 0, 0, 0 ])
			   linear_extrude(height = 40) polygon(a_surface_faceOnePanel, b_surface_faceOnePanel);
}

module subpax_surface_panel_18 () {
	translate( [ -4020, 3035, 0 ])
		rotate( [ 0, 0, 0 ])
			   linear_extrude(height = 40) polygon(a_surface_faceOnePanel, b_surface_faceOnePanel);
}

module subpax_surface_panel_19 () {
	translate( [ -2410, -4540, 0 ])
		rotate( [ 0, 0, 0 ])
			   linear_extrude(height = 40) polygon(a_surface_faceOnePanel, b_surface_faceOnePanel);
}

module subpax_surface_panel_20 () {
	translate( [ -2410, -3530, 0 ])
		rotate( [ 0, 0, 0 ])
			   linear_extrude(height = 40) polygon(a_surface_faceOnePanel, b_surface_faceOnePanel);
}

module subpax_surface_panel_21 () {
	translate( [ -2410, -2520, 0 ])
		rotate( [ 0, 0, 0 ])
			   linear_extrude(height = 40) polygon(a_surface_faceOnePanel, b_surface_faceOnePanel);
}

module subpax_surface_panel_22 () {
	translate( [ -2410, -1510, 0 ])
		rotate( [ 0, 0, 0 ])
			   linear_extrude(height = 40) polygon(a_surface_faceOnePanel, b_surface_faceOnePanel);
}

module subpax_surface_panel_23 () {
	translate( [ -2410, -500, 0 ])
		rotate( [ 0, 0, 0 ])
			   linear_extrude(height = 40) polygon(a_surface_faceOnePanel, b_surface_faceOnePanel);
}

module subpax_surface_panel_24 () {
	translate( [ -2410, 510, 0 ])
		rotate( [ 0, 0, 0 ])
			   linear_extrude(height = 40) polygon(a_surface_faceOnePanel, b_surface_faceOnePanel);
}

module subpax_surface_panel_25 () {
	translate( [ -2410, 1520, 0 ])
		rotate( [ 0, 0, 0 ])
			   linear_extrude(height = 40) polygon(a_surface_faceOnePanel, b_surface_faceOnePanel);
}

module subpax_surface_panel_26 () {
	translate( [ -2410, 2530, 0 ])
		rotate( [ 0, 0, 0 ])
			   linear_extrude(height = 40) polygon(a_surface_faceOnePanel, b_surface_faceOnePanel);
}

module subpax_surface_panel_27 () {
	translate( [ -2410, 3540, 0 ])
		rotate( [ 0, 0, 0 ])
			   linear_extrude(height = 40) polygon(a_surface_faceOnePanel, b_surface_faceOnePanel);
}

module subpax_surface_panel_28 () {
	translate( [ -800, -4035, 0 ])
		rotate( [ 0, 0, 0 ])
			   linear_extrude(height = 40) polygon(a_surface_faceOnePanel, b_surface_faceOnePanel);
}

module subpax_surface_panel_29 () {
	translate( [ -800, -3025, 0 ])
		rotate( [ 0, 0, 0 ])
			   linear_extrude(height = 40) polygon(a_surface_faceOnePanel, b_surface_faceOnePanel);
}

module subpax_surface_panel_30 () {
	translate( [ -800, -2015, 0 ])
		rotate( [ 0, 0, 0 ])
			   linear_extrude(height = 40) polygon(a_surface_faceOnePanel, b_surface_faceOnePanel);
}

module subpax_surface_panel_31 () {
	translate( [ -800, -1005, 0 ])
		rotate( [ 0, 0, 0 ])
			   linear_extrude(height = 40) polygon(a_surface_faceOnePanel, b_surface_faceOnePanel);
}

module subpax_surface_panel_32 () {
	translate( [ -800, 5, 0 ])
		rotate( [ 0, 0, 0 ])
			   linear_extrude(height = 40) polygon(a_surface_faceOnePanel, b_surface_faceOnePanel);
}

module subpax_surface_panel_33 () {
	translate( [ -800, 1015, 0 ])
		rotate( [ 0, 0, 0 ])
			   linear_extrude(height = 40) polygon(a_surface_faceOnePanel, b_surface_faceOnePanel);
}

module subpax_surface_panel_34 () {
	translate( [ -800, 2025, 0 ])
		rotate( [ 0, 0, 0 ])
			   linear_extrude(height = 40) polygon(a_surface_faceOnePanel, b_surface_faceOnePanel);
}

module subpax_surface_panel_35 () {
	translate( [ -800, 3035, 0 ])
		rotate( [ 0, 0, 0 ])
			   linear_extrude(height = 40) polygon(a_surface_faceOnePanel, b_surface_faceOnePanel);
}

module subpax_surface_panel_36 () {
	translate( [ 810, -4540, 0 ])
		rotate( [ 0, 0, 0 ])
			   linear_extrude(height = 40) polygon(a_surface_faceOnePanel, b_surface_faceOnePanel);
}

module subpax_surface_panel_37 () {
	translate( [ 810, -3530, 0 ])
		rotate( [ 0, 0, 0 ])
			   linear_extrude(height = 40) polygon(a_surface_faceOnePanel, b_surface_faceOnePanel);
}

module subpax_surface_panel_38 () {
	translate( [ 810, -2520, 0 ])
		rotate( [ 0, 0, 0 ])
			   linear_extrude(height = 40) polygon(a_surface_faceOnePanel, b_surface_faceOnePanel);
}

module subpax_surface_panel_39 () {
	translate( [ 810, -1510, 0 ])
		rotate( [ 0, 0, 0 ])
			   linear_extrude(height = 40) polygon(a_surface_faceOnePanel, b_surface_faceOnePanel);
}

module subpax_surface_panel_40 () {
	translate( [ 810, -500, 0 ])
		rotate( [ 0, 0, 0 ])
			   linear_extrude(height = 40) polygon(a_surface_faceOnePanel, b_surface_faceOnePanel);
}

module subpax_surface_panel_41 () {
	translate( [ 810, 510, 0 ])
		rotate( [ 0, 0, 0 ])
			   linear_extrude(height = 40) polygon(a_surface_faceOnePanel, b_surface_faceOnePanel);
}

module subpax_surface_panel_42 () {
	translate( [ 810, 1520, 0 ])
		rotate( [ 0, 0, 0 ])
			   linear_extrude(height = 40) polygon(a_surface_faceOnePanel, b_surface_faceOnePanel);
}

module subpax_surface_panel_43 () {
	translate( [ 810, 2530, 0 ])
		rotate( [ 0, 0, 0 ])
			   linear_extrude(height = 40) polygon(a_surface_faceOnePanel, b_surface_faceOnePanel);
}

module subpax_surface_panel_44 () {
	translate( [ 810, 3540, 0 ])
		rotate( [ 0, 0, 0 ])
			   linear_extrude(height = 40) polygon(a_surface_faceOnePanel, b_surface_faceOnePanel);
}

module subpax_surface_panel_45 () {
	translate( [ 2420, -4035, 0 ])
		rotate( [ 0, 0, 0 ])
			   linear_extrude(height = 40) polygon(a_surface_faceOnePanel, b_surface_faceOnePanel);
}

module subpax_surface_panel_46 () {
	translate( [ 2420, -3025, 0 ])
		rotate( [ 0, 0, 0 ])
			   linear_extrude(height = 40) polygon(a_surface_faceOnePanel, b_surface_faceOnePanel);
}

module subpax_surface_panel_47 () {
	translate( [ 2420, -2015, 0 ])
		rotate( [ 0, 0, 0 ])
			   linear_extrude(height = 40) polygon(a_surface_faceOnePanel, b_surface_faceOnePanel);
}

module subpax_surface_panel_48 () {
	translate( [ 2420, -1005, 0 ])
		rotate( [ 0, 0, 0 ])
			   linear_extrude(height = 40) polygon(a_surface_faceOnePanel, b_surface_faceOnePanel);
}

module subpax_surface_panel_49 () {
	translate( [ 2420, 5, 0 ])
		rotate( [ 0, 0, 0 ])
			   linear_extrude(height = 40) polygon(a_surface_faceOnePanel, b_surface_faceOnePanel);
}

module subpax_surface_panel_50 () {
	translate( [ 2420, 1015, 0 ])
		rotate( [ 0, 0, 0 ])
			   linear_extrude(height = 40) polygon(a_surface_faceOnePanel, b_surface_faceOnePanel);
}

module subpax_surface_panel_51 () {
	translate( [ 2420, 2025, 0 ])
		rotate( [ 0, 0, 0 ])
			   linear_extrude(height = 40) polygon(a_surface_faceOnePanel, b_surface_faceOnePanel);
}

module subpax_surface_panel_52 () {
	translate( [ 2420, 3035, 0 ])
		rotate( [ 0, 0, 0 ])
			   linear_extrude(height = 40) polygon(a_surface_faceOnePanel, b_surface_faceOnePanel);
}

module subpax_surface_panel_53 () {
	translate( [ 4030, -3530, 0 ])
		rotate( [ 0, 0, 0 ])
			   linear_extrude(height = 40) polygon(a_surface_faceOnePanel, b_surface_faceOnePanel);
}

module subpax_surface_panel_54 () {
	translate( [ 4030, -2520, 0 ])
		rotate( [ 0, 0, 0 ])
			   linear_extrude(height = 40) polygon(a_surface_faceOnePanel, b_surface_faceOnePanel);
}

module subpax_surface_panel_55 () {
	translate( [ 4030, -1510, 0 ])
		rotate( [ 0, 0, 0 ])
			   linear_extrude(height = 40) polygon(a_surface_faceOnePanel, b_surface_faceOnePanel);
}

module subpax_surface_panel_56 () {
	translate( [ 4030, -500, 0 ])
		rotate( [ 0, 0, 0 ])
			   linear_extrude(height = 40) polygon(a_surface_faceOnePanel, b_surface_faceOnePanel);
}

module subpax_surface_panel_57 () {
	translate( [ 4030, 510, 0 ])
		rotate( [ 0, 0, 0 ])
			   linear_extrude(height = 40) polygon(a_surface_faceOnePanel, b_surface_faceOnePanel);
}

module subpax_surface_panel_58 () {
	translate( [ 4030, 1520, 0 ])
		rotate( [ 0, 0, 0 ])
			   linear_extrude(height = 40) polygon(a_surface_faceOnePanel, b_surface_faceOnePanel);
}

module subpax_surface_panel_59 () {
	translate( [ 4030, 2530, 0 ])
		rotate( [ 0, 0, 0 ])
			   linear_extrude(height = 40) polygon(a_surface_faceOnePanel, b_surface_faceOnePanel);
}

module subpax_surface_panel_60 () {
	translate( [ 5640, -2015, 0 ])
		rotate( [ 0, 0, 0 ])
			   linear_extrude(height = 40) polygon(a_surface_faceOnePanel, b_surface_faceOnePanel);
}

module subpax_surface_panel_61 () {
	translate( [ 5640, -1005, 0 ])
		rotate( [ 0, 0, 0 ])
			   linear_extrude(height = 40) polygon(a_surface_faceOnePanel, b_surface_faceOnePanel);
}

module subpax_surface_panel_62 () {
	translate( [ 5640, 5, 0 ])
		rotate( [ 0, 0, 0 ])
			   linear_extrude(height = 40) polygon(a_surface_faceOnePanel, b_surface_faceOnePanel);
}

module subpax_surface_panel_63 () {
	translate( [ 5640, 1015, 0 ])
		rotate( [ 0, 0, 0 ])
			   linear_extrude(height = 40) polygon(a_surface_faceOnePanel, b_surface_faceOnePanel);
}

module pax_surface () {
	union () {
		subpax_surface_panel_0();
subpax_surface_panel_1();
subpax_surface_panel_2();
subpax_surface_panel_3();
subpax_surface_panel_4();
subpax_surface_panel_5();
subpax_surface_panel_6();
subpax_surface_panel_7();
subpax_surface_panel_8();
subpax_surface_panel_9();
subpax_surface_panel_10();
subpax_surface_panel_11();
subpax_surface_panel_12();
subpax_surface_panel_13();
subpax_surface_panel_14();
subpax_surface_panel_15();
subpax_surface_panel_16();
subpax_surface_panel_17();
subpax_surface_panel_18();
subpax_surface_panel_19();
subpax_surface_panel_20();
subpax_surface_panel_21();
subpax_surface_panel_22();
subpax_surface_panel_23();
subpax_surface_panel_24();
subpax_surface_panel_25();
subpax_surface_panel_26();
subpax_surface_panel_27();
subpax_surface_panel_28();
subpax_surface_panel_29();
subpax_surface_panel_30();
subpax_surface_panel_31();
subpax_surface_panel_32();
subpax_surface_panel_33();
subpax_surface_panel_34();
subpax_surface_panel_35();
subpax_surface_panel_36();
subpax_surface_panel_37();
subpax_surface_panel_38();
subpax_surface_panel_39();
subpax_surface_panel_40();
subpax_surface_panel_41();
subpax_surface_panel_42();
subpax_surface_panel_43();
subpax_surface_panel_44();
subpax_surface_panel_45();
subpax_surface_panel_46();
subpax_surface_panel_47();
subpax_surface_panel_48();
subpax_surface_panel_49();
subpax_surface_panel_50();
subpax_surface_panel_51();
subpax_surface_panel_52();
subpax_surface_panel_53();
subpax_surface_panel_54();
subpax_surface_panel_55();
subpax_surface_panel_56();
subpax_surface_panel_57();
subpax_surface_panel_58();
subpax_surface_panel_59();
subpax_surface_panel_60();
subpax_surface_panel_61();
subpax_surface_panel_62();
subpax_surface_panel_63();
	}
}

pax_surface();
